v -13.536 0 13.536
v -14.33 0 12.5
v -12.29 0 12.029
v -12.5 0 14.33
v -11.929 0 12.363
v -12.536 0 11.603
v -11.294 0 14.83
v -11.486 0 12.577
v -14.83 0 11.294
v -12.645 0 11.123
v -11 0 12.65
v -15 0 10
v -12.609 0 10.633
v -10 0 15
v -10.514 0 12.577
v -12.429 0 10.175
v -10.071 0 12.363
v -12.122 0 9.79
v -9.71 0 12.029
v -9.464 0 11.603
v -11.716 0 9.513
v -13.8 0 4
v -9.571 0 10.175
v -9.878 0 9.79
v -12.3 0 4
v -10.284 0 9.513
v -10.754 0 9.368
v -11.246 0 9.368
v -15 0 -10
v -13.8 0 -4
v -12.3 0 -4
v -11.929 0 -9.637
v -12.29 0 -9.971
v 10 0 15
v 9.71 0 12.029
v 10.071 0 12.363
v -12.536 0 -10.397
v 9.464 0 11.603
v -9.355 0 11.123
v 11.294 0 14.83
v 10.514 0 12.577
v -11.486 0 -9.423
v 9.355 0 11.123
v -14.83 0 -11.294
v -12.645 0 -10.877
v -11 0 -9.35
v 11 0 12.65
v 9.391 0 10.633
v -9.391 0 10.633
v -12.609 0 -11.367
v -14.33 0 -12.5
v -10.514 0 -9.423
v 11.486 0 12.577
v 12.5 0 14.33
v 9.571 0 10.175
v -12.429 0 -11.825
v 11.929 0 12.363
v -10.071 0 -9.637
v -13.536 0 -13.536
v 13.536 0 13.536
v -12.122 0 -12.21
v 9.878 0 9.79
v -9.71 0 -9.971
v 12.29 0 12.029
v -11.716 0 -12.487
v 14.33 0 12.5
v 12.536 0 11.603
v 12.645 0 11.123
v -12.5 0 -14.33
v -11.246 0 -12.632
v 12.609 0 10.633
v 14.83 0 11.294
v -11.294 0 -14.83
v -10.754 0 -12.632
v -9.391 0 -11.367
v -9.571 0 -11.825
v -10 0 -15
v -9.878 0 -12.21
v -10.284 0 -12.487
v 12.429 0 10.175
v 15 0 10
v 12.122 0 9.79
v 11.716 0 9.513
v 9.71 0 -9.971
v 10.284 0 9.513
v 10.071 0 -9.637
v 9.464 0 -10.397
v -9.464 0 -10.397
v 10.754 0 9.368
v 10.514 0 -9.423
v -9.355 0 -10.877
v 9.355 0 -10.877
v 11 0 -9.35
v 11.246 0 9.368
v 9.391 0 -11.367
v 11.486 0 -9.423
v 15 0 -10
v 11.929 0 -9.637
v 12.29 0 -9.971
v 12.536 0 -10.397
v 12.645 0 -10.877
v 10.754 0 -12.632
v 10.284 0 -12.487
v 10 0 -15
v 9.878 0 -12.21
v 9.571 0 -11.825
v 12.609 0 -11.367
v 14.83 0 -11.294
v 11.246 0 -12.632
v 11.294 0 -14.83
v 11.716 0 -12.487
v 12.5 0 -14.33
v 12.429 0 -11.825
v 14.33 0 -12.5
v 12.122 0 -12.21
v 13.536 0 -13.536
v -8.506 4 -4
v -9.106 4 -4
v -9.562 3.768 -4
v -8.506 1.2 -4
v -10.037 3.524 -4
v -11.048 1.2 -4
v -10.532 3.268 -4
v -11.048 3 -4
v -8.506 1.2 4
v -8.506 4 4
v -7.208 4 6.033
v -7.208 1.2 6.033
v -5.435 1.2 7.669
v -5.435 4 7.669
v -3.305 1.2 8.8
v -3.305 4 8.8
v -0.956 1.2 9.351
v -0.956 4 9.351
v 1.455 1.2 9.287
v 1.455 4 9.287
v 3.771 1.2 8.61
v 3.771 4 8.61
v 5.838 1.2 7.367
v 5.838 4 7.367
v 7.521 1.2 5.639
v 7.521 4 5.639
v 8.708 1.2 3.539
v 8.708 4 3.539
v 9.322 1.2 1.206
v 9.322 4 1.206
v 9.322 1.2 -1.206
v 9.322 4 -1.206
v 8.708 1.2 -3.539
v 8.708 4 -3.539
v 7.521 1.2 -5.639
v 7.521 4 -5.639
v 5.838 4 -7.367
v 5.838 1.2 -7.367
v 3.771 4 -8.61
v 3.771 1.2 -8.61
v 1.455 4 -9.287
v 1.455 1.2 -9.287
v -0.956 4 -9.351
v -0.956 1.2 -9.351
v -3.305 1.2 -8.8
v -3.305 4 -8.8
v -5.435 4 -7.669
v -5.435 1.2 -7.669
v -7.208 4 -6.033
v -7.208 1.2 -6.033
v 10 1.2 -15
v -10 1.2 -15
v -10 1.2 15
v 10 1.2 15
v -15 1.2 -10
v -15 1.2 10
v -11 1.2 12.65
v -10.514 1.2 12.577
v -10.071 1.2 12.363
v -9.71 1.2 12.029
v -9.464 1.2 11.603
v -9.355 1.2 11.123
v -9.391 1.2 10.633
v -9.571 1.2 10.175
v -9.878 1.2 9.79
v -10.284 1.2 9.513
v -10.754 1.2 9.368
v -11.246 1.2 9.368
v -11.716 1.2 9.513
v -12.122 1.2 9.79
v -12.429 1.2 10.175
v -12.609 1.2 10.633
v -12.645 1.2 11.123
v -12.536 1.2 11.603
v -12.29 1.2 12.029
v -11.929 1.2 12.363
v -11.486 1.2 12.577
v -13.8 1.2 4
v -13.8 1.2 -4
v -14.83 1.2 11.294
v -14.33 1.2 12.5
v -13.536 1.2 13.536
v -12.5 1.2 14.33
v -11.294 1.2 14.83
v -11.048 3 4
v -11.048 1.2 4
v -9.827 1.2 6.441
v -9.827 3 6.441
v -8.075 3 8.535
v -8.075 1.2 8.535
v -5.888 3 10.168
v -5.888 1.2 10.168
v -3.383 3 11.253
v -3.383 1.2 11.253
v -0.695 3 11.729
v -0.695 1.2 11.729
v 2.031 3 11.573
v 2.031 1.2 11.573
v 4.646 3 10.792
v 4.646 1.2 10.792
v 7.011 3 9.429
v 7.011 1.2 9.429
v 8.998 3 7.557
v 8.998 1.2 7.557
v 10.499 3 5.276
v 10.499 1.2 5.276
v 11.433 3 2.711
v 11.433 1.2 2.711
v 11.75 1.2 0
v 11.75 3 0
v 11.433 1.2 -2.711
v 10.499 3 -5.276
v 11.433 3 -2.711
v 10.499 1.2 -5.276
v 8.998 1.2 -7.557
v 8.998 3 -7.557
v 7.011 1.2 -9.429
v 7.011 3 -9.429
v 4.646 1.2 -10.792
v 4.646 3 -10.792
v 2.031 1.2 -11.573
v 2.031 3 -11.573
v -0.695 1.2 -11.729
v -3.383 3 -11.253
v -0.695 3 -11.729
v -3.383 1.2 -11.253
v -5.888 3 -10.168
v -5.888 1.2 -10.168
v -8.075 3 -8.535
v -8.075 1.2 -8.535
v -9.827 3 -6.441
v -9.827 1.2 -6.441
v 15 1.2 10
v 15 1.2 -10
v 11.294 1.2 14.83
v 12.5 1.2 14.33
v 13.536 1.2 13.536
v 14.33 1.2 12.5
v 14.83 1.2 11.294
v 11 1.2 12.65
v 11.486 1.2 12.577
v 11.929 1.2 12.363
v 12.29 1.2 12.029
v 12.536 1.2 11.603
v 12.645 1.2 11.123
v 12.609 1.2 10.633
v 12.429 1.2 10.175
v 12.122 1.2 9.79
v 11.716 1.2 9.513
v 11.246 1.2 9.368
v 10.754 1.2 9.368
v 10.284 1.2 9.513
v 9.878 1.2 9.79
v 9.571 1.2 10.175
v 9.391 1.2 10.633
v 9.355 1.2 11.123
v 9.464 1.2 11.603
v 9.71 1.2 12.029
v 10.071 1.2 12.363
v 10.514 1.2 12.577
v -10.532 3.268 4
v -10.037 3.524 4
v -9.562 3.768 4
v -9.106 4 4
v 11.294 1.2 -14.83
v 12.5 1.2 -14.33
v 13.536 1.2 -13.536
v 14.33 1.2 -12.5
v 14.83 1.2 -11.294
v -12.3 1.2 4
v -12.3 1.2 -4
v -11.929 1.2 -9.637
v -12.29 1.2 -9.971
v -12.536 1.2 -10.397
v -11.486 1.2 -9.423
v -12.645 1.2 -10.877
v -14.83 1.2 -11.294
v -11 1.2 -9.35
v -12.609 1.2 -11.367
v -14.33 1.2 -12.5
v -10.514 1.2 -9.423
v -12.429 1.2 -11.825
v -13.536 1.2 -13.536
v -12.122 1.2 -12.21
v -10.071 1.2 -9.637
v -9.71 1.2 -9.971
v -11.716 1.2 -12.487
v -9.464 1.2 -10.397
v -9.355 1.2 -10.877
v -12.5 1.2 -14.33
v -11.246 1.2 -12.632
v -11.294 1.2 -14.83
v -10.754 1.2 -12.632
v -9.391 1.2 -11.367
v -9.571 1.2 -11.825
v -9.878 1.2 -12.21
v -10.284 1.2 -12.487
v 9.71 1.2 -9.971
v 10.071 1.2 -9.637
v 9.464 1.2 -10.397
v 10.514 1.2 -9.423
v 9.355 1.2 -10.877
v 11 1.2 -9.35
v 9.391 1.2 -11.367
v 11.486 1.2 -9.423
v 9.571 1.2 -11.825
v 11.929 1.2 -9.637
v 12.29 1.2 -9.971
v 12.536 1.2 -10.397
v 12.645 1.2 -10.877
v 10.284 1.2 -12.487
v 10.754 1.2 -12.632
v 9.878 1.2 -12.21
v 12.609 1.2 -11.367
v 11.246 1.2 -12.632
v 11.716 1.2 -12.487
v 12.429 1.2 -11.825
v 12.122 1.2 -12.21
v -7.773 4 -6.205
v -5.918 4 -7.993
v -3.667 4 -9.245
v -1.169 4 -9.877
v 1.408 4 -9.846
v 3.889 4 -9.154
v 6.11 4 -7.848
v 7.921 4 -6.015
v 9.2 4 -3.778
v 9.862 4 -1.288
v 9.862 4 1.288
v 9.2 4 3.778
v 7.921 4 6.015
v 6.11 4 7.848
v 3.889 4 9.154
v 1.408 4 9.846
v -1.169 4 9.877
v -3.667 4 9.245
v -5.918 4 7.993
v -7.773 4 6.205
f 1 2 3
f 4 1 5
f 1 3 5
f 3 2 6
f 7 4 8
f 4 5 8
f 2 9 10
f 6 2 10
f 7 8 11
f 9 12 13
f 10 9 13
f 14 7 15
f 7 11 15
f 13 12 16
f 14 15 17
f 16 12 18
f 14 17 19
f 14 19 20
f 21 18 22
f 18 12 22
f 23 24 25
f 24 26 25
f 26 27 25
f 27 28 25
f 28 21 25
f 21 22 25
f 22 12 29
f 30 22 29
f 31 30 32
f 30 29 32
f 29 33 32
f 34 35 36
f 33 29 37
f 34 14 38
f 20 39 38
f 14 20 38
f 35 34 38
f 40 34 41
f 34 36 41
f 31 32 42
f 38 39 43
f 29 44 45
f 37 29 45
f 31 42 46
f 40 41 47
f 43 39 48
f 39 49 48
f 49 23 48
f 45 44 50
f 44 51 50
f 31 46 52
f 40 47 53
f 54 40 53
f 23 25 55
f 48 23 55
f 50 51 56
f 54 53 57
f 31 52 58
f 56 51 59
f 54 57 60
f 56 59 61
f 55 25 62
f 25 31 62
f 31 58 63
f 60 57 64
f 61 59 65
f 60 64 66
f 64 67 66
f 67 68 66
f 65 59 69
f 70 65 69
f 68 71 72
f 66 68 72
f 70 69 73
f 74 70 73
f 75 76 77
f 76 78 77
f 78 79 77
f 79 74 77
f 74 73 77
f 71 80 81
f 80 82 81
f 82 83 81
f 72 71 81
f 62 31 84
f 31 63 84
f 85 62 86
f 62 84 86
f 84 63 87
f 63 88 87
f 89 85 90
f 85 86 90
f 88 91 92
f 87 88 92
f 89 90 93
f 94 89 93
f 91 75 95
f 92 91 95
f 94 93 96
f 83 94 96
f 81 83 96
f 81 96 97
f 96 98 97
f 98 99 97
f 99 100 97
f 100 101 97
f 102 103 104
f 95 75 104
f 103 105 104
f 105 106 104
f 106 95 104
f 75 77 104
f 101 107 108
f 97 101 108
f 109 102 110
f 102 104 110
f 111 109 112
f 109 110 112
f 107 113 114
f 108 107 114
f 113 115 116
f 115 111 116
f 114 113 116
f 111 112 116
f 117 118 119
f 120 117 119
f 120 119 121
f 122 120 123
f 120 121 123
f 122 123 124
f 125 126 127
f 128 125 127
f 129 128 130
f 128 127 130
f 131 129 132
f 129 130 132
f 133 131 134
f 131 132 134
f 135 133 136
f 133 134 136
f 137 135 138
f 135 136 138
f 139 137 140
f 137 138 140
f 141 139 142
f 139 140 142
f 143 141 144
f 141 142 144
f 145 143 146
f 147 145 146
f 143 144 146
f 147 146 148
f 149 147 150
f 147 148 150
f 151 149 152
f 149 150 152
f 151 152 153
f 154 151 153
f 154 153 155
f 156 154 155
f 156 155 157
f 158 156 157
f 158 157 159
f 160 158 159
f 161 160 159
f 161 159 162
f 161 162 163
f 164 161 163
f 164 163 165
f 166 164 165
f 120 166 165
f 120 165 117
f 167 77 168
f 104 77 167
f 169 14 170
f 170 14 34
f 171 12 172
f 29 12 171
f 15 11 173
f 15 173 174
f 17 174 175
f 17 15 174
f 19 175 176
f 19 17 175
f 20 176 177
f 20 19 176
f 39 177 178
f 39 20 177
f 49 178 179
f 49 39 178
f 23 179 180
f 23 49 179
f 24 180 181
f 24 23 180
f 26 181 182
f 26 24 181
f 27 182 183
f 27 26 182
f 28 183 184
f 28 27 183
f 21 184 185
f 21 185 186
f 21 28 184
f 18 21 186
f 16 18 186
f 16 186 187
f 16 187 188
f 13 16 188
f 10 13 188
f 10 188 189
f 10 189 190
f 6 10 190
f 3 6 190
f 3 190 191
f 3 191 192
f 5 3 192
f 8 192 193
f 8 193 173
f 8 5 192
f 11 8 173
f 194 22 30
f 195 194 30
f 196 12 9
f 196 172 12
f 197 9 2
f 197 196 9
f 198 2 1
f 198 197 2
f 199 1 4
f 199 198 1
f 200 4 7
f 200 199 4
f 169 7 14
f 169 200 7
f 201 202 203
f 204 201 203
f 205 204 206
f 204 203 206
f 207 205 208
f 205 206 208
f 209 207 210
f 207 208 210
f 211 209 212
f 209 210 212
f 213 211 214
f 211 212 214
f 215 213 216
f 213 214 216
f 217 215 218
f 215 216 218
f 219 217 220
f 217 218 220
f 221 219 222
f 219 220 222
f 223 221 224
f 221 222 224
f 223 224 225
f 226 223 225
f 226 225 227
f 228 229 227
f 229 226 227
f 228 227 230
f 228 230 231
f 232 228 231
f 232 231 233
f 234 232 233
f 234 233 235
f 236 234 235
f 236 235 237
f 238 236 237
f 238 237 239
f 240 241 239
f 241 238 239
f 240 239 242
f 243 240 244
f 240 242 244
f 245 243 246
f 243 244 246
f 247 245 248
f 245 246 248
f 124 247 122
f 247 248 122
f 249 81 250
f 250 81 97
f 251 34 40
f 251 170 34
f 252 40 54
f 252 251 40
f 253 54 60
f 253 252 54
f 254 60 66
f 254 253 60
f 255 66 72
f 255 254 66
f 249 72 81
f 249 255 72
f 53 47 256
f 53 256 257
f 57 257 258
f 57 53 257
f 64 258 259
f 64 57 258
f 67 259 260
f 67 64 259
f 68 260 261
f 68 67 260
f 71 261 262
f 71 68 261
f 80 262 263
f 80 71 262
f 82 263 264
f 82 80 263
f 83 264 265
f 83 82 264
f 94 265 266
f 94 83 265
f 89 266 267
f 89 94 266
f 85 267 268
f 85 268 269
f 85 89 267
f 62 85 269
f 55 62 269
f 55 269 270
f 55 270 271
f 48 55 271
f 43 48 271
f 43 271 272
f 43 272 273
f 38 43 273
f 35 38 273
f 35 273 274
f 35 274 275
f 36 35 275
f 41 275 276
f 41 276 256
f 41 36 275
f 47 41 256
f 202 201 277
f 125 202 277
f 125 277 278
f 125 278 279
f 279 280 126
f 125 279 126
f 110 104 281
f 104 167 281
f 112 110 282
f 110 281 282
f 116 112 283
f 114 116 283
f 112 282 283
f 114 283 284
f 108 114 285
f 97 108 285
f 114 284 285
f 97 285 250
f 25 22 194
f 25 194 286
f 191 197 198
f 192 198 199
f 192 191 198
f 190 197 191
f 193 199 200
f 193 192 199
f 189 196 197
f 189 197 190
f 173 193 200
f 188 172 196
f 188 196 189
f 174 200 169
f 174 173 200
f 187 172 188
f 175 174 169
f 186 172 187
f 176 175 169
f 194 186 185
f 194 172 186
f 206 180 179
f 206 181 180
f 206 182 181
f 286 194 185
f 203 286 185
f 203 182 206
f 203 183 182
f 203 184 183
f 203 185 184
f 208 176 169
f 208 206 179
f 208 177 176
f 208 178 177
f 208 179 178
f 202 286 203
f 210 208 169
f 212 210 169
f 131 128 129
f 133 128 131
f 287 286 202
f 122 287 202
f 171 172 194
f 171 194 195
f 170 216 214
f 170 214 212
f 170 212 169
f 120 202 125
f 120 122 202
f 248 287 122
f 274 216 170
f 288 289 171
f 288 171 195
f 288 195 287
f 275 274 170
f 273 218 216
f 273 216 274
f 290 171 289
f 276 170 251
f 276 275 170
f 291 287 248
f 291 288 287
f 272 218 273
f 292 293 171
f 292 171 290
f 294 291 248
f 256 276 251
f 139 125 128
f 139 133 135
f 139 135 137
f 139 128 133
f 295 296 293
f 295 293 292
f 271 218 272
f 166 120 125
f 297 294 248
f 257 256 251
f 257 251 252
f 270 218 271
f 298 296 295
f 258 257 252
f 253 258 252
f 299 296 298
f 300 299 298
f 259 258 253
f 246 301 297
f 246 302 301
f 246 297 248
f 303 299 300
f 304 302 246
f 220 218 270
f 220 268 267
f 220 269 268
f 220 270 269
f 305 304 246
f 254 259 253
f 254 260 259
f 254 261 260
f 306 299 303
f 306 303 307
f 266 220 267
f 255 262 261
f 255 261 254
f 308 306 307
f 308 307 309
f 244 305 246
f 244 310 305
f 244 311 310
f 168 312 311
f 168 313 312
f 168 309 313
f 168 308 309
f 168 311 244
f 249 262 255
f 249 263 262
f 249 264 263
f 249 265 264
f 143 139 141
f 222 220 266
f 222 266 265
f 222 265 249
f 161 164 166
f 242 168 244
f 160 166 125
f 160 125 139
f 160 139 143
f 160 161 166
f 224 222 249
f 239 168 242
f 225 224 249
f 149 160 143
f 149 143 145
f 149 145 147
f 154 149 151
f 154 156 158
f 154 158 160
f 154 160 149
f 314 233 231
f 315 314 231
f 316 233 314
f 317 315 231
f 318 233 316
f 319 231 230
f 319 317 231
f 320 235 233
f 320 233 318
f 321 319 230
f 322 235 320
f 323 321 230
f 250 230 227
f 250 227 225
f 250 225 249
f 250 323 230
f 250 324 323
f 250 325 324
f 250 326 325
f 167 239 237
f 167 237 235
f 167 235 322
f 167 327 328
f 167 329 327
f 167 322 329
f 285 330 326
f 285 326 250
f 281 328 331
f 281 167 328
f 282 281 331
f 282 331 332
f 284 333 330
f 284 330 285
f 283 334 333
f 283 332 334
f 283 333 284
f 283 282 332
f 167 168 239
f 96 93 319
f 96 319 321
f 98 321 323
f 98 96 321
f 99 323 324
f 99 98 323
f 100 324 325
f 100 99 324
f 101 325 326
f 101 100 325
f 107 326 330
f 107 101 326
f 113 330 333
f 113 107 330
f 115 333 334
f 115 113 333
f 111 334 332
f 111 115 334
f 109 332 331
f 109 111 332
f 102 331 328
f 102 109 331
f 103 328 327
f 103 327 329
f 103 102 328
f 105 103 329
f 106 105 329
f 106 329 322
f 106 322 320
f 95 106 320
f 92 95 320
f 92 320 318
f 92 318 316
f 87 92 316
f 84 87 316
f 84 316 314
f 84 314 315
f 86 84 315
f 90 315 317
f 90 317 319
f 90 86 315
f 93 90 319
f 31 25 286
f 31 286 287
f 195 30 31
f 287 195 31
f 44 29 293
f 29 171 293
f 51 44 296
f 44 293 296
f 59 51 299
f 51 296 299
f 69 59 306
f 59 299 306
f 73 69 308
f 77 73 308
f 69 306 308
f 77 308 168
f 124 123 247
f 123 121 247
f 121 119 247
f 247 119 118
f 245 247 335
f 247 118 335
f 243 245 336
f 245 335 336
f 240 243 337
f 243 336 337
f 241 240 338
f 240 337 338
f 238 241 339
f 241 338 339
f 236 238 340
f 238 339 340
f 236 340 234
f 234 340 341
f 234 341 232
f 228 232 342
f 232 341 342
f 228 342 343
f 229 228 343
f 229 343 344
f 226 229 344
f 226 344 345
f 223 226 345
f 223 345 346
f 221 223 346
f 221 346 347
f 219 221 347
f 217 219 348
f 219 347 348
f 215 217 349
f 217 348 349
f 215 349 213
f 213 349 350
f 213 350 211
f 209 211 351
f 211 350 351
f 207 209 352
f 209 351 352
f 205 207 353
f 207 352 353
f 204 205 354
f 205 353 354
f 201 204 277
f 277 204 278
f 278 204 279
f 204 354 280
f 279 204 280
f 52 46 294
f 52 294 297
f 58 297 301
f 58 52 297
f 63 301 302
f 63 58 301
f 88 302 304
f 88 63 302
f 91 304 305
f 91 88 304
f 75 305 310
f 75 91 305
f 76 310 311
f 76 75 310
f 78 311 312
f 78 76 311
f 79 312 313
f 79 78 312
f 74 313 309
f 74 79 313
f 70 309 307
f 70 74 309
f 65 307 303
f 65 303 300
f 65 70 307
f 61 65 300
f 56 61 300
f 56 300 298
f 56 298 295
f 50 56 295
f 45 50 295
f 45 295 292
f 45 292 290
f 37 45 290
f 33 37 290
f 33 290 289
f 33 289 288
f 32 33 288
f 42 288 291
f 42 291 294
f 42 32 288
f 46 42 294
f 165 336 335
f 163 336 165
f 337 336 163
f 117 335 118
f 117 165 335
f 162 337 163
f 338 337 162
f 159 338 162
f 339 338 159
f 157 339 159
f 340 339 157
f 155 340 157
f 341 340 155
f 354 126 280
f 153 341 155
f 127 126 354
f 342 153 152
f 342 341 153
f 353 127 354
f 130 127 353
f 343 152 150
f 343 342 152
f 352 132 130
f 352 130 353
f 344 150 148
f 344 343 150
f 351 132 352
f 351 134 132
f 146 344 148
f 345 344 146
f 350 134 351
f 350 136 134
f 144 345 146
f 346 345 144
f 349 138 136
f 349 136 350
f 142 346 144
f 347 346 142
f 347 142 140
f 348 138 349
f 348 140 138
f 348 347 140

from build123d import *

# Parameters (mm, degrees)
SKETCH2_R           = 11.75
BOSS_EXTRUDE1_DEPTH = 4
CUT_EXTRUDE1_DEPTH  = 4
SKETCH4_W           = 30
SKETCH4_H           = 30
SKETCH4_R           = 1.65
BOSS_EXTRUDE2_DEPTH = 1.2
FILLET2_R           = 5
SKETCH6_W           = 1.5
SKETCH6_H           = 8
CUT_EXTRUDE2_DEPTH  = 10
CHAMFER1_SIZE       = 1
CHAMFER1_SIZE2      = 1.804047755


with BuildPart() as part:
    # Sketch2 → Boss-Extrude1 (new body)
    with BuildSketch(Plane(origin=(0, 0, 0), x_dir=(1, 0, 0), z_dir=(0, 1, 0))):
        with Locations(Location((0, 0, 0), (0, 0, 270))):
            Circle(SKETCH2_R)
    extrude(amount=BOSS_EXTRUDE1_DEPTH)

    # Sketch3 → Cut-Extrude1 (cut)
    with BuildSketch(Plane(origin=(0, 4, 0), x_dir=(1, 0, 0), z_dir=(0, 1, 0))):
        with BuildLine():
            Line((-8.506468127, 4), (-15.473450434, 4))
            Line((-15.473450434, 4), (-15.473450434, -4))
            Line((-15.473450434, -4), (-8.506468127, -4))
            ThreePointArc((-8.506468127, -4), (9.4, 0), (-8.506468127, 4))
        make_face()
    extrude(amount=-CUT_EXTRUDE1_DEPTH, mode=Mode.SUBTRACT)

    # Sketch4 → Boss-Extrude2 (add)
    with BuildSketch(Plane(origin=(0, 0, 0), x_dir=(1, 0, 0), z_dir=(0, 1, 0))):
        Rectangle(SKETCH4_W, SKETCH4_H)
        with Locations(Location((11, -11, 0), (0, 0, 270))):
            Circle(SKETCH4_R, mode=Mode.SUBTRACT)
        with Locations(Location((-11, -11, 0), (0, 0, 270))):
            Circle(SKETCH4_R, mode=Mode.SUBTRACT)
        with Locations(Location((-11, 11, 0), (0, 0, 270))):
            Circle(SKETCH4_R, mode=Mode.SUBTRACT)
        with Locations(Location((11, 11, 0), (0, 0, 270))):
            Circle(SKETCH4_R, mode=Mode.SUBTRACT)
    extrude(amount=BOSS_EXTRUDE2_DEPTH)

    # Fillet2
    fillet2_edges = [part.edges().sort_by_distance(p)[0] for p in [
        (15, 0.6, 15),
        (15, 0.6, -15),
        (-15, 0.6, -15),
        (-15, 0.6, 15),
    ]]
    fillet(fillet2_edges, radius=FILLET2_R)

    # Sketch6 → Cut-Extrude2 (cut)
    with BuildSketch(Plane(origin=(0, 0, 0), x_dir=(1, 0, 0), z_dir=(0, 1, 0))):
        with Locations((-13.05, 0)):
            Rectangle(SKETCH6_W, SKETCH6_H)
    extrude(amount=CUT_EXTRUDE2_DEPTH, mode=Mode.SUBTRACT)

    # Chamfer1
    chamfer1_edges = [part.edges().sort_by_distance(p)[0] for p in [
        (11.75, 4, 0),
    ]]
    chamfer1_side = [part.faces().sort_by_distance(p)[0] for p in [
        (11.75, 2.6, 0),
    ]]
    chamfer(chamfer1_edges, length=CHAMFER1_SIZE, length2=CHAMFER1_SIZE2, reference=chamfer1_side[0])


solid = part.part
